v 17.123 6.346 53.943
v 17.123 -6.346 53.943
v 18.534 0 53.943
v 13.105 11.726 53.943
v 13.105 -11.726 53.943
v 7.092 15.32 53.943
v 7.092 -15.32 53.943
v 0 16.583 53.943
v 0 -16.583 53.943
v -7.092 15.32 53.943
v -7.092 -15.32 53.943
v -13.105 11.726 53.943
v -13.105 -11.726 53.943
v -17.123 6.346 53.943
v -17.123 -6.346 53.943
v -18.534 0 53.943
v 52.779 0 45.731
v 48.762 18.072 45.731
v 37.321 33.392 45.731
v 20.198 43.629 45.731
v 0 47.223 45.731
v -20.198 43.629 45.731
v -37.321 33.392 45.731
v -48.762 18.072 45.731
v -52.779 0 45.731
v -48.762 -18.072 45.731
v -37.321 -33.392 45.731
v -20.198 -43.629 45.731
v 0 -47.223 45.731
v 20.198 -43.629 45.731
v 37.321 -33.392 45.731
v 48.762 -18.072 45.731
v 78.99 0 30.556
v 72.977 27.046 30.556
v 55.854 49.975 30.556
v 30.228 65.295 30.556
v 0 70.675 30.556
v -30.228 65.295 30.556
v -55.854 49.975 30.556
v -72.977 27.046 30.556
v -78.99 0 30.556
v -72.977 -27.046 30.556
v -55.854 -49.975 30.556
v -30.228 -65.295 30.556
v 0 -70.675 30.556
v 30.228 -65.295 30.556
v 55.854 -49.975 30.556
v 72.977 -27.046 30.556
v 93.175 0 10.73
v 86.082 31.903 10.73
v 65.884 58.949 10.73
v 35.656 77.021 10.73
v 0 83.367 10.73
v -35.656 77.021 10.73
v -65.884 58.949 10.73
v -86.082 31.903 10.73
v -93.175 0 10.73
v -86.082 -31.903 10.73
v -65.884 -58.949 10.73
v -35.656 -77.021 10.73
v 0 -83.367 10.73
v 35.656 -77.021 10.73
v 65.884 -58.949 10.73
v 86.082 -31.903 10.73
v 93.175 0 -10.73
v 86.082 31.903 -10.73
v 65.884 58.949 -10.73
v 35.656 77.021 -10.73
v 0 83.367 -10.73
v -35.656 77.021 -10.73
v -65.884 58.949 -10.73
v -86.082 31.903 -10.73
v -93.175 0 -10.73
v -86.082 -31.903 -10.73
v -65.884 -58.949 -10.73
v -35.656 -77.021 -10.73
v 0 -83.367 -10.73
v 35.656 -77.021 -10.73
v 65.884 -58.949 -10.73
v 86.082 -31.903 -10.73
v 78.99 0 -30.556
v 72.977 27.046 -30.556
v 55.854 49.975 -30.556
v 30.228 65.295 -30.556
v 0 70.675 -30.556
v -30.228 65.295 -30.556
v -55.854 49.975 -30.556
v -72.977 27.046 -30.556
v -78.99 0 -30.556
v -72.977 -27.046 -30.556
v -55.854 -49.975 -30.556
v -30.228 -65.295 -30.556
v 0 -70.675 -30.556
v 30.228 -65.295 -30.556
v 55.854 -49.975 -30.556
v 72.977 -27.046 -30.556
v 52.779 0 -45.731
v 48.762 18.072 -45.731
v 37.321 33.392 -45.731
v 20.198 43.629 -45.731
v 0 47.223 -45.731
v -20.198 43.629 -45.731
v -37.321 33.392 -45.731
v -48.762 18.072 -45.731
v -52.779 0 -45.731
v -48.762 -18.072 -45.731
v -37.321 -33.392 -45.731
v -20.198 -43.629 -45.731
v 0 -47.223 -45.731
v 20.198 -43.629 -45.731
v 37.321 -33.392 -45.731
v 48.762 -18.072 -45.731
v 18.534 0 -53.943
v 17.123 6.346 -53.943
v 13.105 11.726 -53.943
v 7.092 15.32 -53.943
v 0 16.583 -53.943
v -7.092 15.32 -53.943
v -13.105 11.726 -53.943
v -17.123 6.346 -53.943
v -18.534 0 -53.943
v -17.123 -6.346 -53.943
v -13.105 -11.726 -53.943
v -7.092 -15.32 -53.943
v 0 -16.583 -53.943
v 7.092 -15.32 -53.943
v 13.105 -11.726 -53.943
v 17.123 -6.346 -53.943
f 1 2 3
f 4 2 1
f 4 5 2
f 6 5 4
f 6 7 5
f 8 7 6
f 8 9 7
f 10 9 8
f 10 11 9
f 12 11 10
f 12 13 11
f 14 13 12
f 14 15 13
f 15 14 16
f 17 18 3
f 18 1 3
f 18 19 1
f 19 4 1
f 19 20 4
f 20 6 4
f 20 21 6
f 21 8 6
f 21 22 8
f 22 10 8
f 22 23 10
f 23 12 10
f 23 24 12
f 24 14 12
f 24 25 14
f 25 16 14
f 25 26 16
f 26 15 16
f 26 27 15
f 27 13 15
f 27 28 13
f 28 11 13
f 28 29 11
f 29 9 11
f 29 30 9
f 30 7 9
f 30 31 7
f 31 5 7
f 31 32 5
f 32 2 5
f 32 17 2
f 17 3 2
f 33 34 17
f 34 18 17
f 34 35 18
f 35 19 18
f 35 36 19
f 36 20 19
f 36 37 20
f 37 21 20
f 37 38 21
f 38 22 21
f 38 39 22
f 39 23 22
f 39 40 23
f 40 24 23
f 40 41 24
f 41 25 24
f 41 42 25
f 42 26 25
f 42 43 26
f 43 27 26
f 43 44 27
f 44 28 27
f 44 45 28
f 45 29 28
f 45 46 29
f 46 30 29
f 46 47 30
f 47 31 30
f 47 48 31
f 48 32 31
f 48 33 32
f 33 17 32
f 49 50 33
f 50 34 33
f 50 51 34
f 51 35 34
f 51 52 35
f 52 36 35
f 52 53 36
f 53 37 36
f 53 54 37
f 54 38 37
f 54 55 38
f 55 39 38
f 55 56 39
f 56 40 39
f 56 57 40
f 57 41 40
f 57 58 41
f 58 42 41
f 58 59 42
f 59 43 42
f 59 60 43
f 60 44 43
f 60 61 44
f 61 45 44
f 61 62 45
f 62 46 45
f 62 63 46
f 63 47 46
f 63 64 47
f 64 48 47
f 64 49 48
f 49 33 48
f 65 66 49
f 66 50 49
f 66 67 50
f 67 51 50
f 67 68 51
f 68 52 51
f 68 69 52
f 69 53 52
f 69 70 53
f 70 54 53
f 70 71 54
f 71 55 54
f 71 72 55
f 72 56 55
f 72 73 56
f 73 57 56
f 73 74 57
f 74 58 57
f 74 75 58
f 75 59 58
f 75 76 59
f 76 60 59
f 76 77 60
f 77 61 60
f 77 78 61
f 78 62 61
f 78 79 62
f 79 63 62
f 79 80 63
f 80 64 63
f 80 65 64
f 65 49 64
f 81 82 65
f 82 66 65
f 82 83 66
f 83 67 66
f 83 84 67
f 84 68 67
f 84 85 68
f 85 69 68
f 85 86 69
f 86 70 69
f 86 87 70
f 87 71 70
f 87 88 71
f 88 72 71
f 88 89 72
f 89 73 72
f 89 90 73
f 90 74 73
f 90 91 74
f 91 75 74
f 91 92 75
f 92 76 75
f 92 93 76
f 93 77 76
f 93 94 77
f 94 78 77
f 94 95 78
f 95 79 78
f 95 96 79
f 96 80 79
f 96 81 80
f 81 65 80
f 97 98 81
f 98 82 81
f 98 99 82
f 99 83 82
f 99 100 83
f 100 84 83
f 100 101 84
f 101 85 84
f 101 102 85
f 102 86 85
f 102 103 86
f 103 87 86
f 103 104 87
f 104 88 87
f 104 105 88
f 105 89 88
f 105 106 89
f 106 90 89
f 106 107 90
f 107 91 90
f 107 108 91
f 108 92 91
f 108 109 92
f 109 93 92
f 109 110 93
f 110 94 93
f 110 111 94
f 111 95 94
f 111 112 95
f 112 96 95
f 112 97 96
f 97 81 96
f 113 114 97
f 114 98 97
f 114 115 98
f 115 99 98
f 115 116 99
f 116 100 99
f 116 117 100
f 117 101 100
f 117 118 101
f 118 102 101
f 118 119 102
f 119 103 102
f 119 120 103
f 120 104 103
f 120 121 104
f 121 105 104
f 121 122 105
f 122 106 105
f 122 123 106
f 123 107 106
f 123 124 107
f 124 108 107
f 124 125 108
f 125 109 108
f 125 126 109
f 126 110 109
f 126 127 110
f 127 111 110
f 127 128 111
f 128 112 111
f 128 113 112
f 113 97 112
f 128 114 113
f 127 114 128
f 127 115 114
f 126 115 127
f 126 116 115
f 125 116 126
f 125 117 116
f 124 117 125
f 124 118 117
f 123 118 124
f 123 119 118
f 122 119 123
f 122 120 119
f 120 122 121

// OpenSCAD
// Generated by SolidPython 1.0.1 on 2020-07-29 00:46:54


scale(v = [19, 17, 11]) {
	sphere(r = 5);
}
/***********************************************
*********      SolidPython code:      **********
************************************************
 
# import packages: SolidPython
from solid import *
from solid.utils import *
from itertools import chain, combinations, permutations


class Resize:

    def __init__(self, scad_file):
        self.scad_file = scad_file
        #self.scad_file = import_scad(scad_file)
        # cone/cylinder param:
        self.r1 = 0
        self.r2 = 0
        self.h = 0
        # rectangular prism param:
        self.w = 0
        self.l = 0
        # ellipse param:
        self.r = 0

    # import OpenScad code (file name corresponds to shape)


    # classify shape + parameters
    def assign(self, param1, param2, param3):
        if self.scad_file == 'cone.scad':
            self.r1 = param1
            self.r2 = param2
            self.h = param3
        elif self.scad_file == 'cylinder.scad':
            self.r1 = param1
            self.r2 = param2
            self.h = param3
        elif self.scad_file == 'rectangularPrism.scad':
            self.h = param1
            self.l = param2
            self.w = param3
        else:
            self.r = param1
            self.h = param2

    # resize parameters
    def iterate(self):
        x = range(3, 20, 2)
        i = 1
        if self.scad_file == 'cone.scad':
            tempList = list(permutations(x, 2))
            for temp in tempList:
                param1 = temp[0]
                param2 = temp[1]
                filepath = 'produced_scad_files/' + 'cone' + str(param1) + '_' + str(param2) + '_' + '.scad'
                scad_render_to_file(cylinder(h=param1, r1=param2, r2=0), filepath)

        elif self.scad_file == 'cylinder.scad':
            tempList = list(permutations(x, 3))
            for temp in tempList:
                param1 = temp[0]
                param2 = temp[1]
                filepath = 'produced_scad_files/' + 'cylinder' + str(param1) + '_' + str(param2) + '_' + '.scad'
                scad_render_to_file(cylinder(h=param1, r1=param2, r2=param2), filepath)

        elif self.scad_file == 'rectangularPrism.scad':
            tempList = list(permutations(x, 3))
            for temp in tempList:
                param1 = temp[0]
                param2 = temp[1]
                param3 = temp[2]
                filepath = 'produced_scad_files/' + 'rectangularPrism' + str(param1) + '_' + str(param2) + '_' + str(
                    param3) + '.scad'
                scad_render_to_file(cube(size=(param1, param2, param3)), filepath)

        elif self.scad_file == 'ellipse.scad':
            tempList = list(permutations(x, 4))
            for temp in tempList:
                param1 = temp[0]
                param2 = temp[1]
                param3 = temp[2]
                param4 = temp[3]
                filepath = 'produced_scad_files/' + 'ellipse' + str(param1) + '_' + str(param2) + '_' + str(param3) + '_' + str(param4) + '.scad'
                scad_render_to_file(scale([param1, param2, param3])(sphere(r=param4)), filepath)

    def render_to_scadfile(self):
        scad_render_to_file(scad, 'example.scad') 
 
************************************************/
